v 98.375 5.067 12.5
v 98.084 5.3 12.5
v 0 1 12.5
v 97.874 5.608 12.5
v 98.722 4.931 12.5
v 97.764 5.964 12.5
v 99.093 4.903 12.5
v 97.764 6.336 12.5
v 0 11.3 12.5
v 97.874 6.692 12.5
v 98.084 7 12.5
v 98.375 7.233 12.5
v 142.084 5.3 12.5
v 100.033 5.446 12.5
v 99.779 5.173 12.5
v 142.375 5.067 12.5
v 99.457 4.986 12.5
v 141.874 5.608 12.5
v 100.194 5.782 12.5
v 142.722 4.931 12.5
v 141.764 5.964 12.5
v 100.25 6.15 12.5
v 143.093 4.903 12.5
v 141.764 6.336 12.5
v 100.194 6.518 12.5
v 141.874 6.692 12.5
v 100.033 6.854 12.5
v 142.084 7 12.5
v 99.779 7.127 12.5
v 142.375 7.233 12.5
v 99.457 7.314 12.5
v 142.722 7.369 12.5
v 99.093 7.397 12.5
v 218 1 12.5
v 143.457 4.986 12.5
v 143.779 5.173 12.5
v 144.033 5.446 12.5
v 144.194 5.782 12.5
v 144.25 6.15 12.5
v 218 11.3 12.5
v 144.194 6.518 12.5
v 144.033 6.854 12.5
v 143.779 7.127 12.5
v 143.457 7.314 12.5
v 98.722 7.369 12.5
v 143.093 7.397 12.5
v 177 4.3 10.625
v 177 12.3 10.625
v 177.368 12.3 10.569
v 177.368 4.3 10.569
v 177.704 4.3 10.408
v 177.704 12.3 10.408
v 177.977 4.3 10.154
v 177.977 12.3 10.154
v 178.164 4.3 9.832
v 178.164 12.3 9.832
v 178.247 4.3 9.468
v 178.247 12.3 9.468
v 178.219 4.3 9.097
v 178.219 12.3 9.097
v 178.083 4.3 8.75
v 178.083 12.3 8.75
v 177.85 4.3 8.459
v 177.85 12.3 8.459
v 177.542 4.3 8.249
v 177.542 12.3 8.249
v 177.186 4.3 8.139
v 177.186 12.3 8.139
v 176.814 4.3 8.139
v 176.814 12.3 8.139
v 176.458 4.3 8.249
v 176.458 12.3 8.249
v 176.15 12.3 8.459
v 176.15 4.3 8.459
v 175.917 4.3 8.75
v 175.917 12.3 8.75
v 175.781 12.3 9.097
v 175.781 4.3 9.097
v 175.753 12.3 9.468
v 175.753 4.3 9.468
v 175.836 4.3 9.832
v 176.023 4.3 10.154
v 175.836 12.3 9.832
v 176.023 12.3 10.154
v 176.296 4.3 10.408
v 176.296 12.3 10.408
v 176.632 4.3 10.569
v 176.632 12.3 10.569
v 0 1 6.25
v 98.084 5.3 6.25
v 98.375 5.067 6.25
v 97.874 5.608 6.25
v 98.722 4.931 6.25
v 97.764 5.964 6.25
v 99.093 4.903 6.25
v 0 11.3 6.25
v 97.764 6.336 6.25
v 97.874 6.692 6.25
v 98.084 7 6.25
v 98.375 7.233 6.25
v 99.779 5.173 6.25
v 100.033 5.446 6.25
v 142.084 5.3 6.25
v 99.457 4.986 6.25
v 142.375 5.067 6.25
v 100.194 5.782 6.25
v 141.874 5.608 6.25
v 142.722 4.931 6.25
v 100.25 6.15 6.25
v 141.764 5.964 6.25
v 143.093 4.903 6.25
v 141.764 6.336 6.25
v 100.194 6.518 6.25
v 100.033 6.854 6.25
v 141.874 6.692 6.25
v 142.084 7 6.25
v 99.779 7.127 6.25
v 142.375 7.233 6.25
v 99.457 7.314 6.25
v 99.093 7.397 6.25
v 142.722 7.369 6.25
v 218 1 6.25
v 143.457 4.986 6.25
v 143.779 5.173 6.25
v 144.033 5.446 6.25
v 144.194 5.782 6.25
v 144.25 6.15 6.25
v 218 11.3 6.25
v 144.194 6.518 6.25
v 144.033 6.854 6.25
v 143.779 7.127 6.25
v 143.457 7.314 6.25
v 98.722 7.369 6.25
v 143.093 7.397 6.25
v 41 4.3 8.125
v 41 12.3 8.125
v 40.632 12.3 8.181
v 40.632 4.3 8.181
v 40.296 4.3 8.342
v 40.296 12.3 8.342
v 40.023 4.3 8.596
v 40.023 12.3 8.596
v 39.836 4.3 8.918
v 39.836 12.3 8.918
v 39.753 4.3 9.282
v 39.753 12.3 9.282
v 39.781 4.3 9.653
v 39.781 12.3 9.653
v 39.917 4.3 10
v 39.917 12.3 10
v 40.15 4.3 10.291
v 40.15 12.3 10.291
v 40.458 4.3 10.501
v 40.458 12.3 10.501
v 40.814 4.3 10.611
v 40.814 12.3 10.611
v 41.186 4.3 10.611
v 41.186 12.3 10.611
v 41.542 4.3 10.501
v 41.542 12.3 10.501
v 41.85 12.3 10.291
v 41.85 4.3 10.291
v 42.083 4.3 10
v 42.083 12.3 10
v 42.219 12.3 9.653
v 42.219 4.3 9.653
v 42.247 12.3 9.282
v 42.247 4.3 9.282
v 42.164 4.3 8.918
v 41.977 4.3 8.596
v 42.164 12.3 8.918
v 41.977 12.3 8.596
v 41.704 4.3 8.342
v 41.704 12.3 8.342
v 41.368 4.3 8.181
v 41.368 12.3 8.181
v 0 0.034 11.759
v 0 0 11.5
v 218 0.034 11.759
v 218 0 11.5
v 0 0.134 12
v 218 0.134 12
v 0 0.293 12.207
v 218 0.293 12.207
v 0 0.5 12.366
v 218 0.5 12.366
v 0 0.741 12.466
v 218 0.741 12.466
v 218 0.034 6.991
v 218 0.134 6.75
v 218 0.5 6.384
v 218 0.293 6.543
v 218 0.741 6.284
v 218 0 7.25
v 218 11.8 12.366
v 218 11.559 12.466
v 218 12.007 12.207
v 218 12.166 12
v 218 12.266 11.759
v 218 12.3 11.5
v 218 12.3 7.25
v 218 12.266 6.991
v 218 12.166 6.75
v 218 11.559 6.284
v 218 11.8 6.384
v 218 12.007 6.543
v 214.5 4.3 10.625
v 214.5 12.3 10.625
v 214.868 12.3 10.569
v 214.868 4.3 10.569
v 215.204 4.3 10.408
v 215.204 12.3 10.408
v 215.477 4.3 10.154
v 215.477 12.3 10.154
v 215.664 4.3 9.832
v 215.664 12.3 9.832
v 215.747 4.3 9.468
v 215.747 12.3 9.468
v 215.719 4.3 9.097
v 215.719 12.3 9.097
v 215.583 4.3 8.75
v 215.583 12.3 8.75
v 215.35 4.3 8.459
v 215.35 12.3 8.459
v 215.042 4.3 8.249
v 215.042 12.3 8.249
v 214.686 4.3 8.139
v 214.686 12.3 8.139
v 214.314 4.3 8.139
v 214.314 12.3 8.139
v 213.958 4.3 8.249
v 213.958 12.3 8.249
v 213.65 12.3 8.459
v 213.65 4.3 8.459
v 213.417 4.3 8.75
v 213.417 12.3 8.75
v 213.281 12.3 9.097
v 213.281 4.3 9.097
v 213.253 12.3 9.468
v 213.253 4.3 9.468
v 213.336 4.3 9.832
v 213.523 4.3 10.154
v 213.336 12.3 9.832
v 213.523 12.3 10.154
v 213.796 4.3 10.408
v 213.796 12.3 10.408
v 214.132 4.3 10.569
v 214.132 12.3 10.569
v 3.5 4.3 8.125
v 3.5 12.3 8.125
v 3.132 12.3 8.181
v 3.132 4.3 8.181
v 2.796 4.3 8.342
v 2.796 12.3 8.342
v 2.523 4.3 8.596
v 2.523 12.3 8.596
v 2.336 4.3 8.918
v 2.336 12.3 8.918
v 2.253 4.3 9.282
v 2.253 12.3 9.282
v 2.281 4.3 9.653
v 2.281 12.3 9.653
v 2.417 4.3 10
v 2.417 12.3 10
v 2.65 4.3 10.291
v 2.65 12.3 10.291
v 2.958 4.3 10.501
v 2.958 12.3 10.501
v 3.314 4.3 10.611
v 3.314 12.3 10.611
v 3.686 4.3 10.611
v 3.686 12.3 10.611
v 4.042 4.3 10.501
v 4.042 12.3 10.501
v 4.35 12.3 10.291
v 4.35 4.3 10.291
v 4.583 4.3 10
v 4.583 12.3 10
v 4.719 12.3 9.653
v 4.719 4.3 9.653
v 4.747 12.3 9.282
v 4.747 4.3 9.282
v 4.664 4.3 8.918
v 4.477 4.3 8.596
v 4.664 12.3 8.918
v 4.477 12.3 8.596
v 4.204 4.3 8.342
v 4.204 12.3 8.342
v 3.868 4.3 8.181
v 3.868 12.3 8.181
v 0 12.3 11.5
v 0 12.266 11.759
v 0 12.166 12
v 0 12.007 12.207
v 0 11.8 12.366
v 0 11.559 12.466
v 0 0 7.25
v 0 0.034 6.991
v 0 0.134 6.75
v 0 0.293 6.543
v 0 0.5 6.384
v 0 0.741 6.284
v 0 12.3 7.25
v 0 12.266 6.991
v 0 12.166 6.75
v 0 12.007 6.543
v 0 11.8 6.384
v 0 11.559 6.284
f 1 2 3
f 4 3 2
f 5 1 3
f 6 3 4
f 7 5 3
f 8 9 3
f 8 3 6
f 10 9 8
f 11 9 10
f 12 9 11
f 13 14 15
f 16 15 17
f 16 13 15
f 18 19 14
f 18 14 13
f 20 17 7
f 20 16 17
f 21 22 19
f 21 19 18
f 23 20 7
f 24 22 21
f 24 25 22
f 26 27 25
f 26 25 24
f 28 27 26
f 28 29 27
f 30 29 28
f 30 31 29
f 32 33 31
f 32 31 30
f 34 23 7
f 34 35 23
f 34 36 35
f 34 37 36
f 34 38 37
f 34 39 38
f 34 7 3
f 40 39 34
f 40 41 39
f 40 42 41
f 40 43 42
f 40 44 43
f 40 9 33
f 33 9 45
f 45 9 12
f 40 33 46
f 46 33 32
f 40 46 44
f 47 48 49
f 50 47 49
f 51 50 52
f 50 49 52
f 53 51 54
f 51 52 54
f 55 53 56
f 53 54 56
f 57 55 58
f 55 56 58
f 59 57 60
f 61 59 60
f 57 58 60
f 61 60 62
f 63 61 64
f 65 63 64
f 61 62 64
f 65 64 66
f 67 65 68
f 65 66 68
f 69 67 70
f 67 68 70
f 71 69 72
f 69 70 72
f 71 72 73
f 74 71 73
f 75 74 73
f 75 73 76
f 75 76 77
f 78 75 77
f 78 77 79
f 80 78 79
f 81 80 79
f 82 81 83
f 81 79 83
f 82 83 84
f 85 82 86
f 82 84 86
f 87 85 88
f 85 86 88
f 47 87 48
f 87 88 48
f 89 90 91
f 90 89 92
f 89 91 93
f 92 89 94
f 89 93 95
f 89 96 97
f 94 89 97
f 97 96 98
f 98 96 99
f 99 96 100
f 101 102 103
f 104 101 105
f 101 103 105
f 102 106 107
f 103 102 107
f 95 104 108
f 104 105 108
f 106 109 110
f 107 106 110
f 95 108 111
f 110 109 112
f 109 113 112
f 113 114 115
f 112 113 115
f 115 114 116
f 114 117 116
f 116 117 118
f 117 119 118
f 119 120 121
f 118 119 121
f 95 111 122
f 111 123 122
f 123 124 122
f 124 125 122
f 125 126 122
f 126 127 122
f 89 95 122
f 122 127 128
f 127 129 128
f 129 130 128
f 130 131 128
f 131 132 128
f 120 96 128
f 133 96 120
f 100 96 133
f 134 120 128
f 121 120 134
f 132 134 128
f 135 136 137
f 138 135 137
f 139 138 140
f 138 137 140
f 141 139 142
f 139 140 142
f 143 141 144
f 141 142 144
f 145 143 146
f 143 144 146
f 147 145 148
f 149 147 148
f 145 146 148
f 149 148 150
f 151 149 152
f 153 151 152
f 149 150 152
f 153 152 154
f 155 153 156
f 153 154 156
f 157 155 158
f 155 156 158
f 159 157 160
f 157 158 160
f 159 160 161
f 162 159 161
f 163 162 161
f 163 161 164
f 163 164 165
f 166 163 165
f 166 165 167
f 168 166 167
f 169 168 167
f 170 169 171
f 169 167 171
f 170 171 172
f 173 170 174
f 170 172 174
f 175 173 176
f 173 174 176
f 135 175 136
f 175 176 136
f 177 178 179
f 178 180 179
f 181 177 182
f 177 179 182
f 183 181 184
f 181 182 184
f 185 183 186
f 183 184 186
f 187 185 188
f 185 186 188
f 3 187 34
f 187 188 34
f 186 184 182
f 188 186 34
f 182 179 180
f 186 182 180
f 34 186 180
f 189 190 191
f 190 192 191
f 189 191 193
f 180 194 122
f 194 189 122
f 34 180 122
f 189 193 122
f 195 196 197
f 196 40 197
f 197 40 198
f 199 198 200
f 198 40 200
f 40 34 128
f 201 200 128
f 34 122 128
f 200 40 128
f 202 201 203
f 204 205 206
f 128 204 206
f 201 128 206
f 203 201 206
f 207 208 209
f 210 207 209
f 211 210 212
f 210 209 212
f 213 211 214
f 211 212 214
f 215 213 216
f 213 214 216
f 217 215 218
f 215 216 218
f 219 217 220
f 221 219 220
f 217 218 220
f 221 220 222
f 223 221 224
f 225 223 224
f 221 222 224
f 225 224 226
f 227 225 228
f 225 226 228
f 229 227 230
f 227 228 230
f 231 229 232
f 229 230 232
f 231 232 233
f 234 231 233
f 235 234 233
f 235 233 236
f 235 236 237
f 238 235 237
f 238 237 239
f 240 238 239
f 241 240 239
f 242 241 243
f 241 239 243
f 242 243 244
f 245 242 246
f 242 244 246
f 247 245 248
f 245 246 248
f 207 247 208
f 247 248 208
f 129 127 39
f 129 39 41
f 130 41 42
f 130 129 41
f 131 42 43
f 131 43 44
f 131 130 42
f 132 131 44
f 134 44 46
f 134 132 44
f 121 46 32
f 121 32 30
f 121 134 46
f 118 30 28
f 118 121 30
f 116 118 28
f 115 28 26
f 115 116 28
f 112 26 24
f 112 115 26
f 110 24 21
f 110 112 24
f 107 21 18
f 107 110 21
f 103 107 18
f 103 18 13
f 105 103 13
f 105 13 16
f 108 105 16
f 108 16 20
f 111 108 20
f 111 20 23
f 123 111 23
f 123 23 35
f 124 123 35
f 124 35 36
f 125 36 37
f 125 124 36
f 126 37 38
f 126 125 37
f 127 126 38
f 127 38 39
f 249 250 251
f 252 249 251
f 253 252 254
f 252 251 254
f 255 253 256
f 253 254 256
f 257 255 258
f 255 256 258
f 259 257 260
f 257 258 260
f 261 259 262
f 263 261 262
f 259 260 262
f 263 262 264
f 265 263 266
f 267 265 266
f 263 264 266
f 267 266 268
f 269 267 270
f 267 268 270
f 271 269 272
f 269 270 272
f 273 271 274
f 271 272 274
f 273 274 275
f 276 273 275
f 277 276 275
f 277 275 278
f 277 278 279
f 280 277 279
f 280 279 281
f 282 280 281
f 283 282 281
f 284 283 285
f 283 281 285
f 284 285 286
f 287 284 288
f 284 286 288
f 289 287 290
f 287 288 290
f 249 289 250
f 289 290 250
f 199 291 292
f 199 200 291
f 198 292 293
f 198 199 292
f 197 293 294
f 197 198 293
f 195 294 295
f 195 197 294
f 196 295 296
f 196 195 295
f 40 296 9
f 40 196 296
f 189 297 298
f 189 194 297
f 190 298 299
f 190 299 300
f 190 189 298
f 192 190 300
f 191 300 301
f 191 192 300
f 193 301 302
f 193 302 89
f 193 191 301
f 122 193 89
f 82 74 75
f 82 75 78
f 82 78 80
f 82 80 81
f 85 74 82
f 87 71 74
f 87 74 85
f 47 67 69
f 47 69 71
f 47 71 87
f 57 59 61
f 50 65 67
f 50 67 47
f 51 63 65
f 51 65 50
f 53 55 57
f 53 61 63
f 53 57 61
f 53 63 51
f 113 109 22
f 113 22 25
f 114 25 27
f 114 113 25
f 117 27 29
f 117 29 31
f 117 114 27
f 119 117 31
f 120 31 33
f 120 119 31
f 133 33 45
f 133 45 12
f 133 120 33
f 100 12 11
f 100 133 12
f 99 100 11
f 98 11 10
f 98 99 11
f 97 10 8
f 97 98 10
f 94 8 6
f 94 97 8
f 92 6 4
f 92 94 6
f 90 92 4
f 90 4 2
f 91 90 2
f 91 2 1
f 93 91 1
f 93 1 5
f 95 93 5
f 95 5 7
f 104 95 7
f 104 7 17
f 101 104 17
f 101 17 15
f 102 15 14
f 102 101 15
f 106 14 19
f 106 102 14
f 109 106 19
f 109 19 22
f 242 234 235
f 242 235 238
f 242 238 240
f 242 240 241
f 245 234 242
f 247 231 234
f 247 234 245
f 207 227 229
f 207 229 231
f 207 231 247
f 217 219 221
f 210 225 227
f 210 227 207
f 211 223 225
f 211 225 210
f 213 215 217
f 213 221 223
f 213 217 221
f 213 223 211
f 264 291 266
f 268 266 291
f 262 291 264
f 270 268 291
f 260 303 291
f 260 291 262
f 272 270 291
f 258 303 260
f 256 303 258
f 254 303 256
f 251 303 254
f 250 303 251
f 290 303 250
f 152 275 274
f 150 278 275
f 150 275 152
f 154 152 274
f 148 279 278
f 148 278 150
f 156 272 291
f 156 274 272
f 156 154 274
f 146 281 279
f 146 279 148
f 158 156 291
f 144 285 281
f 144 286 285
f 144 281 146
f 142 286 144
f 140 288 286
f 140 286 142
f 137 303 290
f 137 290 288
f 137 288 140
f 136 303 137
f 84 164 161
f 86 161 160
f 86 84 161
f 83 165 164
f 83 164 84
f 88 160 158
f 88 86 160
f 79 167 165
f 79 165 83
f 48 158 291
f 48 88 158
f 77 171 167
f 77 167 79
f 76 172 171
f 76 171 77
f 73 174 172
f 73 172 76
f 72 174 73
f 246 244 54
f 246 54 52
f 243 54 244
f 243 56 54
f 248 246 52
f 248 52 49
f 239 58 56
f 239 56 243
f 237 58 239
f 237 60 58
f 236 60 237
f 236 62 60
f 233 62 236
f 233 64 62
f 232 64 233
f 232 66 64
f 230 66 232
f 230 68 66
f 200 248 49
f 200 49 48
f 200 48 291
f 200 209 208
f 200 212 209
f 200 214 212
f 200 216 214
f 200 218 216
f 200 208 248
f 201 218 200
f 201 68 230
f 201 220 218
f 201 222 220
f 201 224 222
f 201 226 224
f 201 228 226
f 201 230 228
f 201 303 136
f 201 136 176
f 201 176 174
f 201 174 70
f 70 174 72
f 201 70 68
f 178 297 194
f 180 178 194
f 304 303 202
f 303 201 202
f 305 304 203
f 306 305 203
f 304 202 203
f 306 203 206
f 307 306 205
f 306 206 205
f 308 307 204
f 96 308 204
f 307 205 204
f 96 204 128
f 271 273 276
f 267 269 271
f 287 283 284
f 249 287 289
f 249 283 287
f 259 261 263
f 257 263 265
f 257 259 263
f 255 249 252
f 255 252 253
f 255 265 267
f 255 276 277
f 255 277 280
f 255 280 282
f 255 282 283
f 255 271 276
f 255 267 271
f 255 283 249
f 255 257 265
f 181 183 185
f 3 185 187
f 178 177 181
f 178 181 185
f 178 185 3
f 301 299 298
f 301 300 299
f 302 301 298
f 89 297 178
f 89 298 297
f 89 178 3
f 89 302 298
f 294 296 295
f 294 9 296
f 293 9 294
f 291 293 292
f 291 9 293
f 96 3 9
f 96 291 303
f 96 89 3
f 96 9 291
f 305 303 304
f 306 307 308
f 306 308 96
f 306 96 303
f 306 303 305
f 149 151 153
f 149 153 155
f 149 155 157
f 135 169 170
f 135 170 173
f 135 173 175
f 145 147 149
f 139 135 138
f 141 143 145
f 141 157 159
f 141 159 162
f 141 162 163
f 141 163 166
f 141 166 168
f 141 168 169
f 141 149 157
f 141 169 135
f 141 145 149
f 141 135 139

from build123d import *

# Parameters (mm, degrees)
SKETCH1_W           = 218
SKETCH1_H           = 12.3
SKETCH1_R           = 1.25
BOSS_EXTRUDE1_DEPTH = 6.25
SKETCH2_R           = 1.25
CUT_EXTRUDE1_DEPTH  = 8
FILLET1_R           = 1


with BuildPart() as part:
    # Sketch1 → Boss-Extrude1 (new body)
    with BuildSketch(Plane.XY):
        with Locations((109, 6.15)):
            Rectangle(SKETCH1_W, SKETCH1_H)
        with Locations((143, 6.15)):
            Circle(SKETCH1_R, mode=Mode.SUBTRACT)
        with Locations((99, 6.15)):
            Circle(SKETCH1_R, mode=Mode.SUBTRACT)
    extrude(amount=BOSS_EXTRUDE1_DEPTH)

    # Sketch2 → Cut-Extrude1 (cut)
    with BuildSketch(Plane(origin=(0, 12.3, 0), x_dir=(1, 0, 0), z_dir=(0, 1, 0))):
        with Locations(Location((214.5, -3.125, 0), (0, 0, 270))):
            Circle(SKETCH2_R)
        with Locations(Location((177, -3.125, 0), (0, 0, 270))):
            Circle(SKETCH2_R)
        with Locations(Location((3.5, -3.125, 0), (0, 0, 90))):
            Circle(SKETCH2_R)
        with Locations(Location((41, -3.125, 0), (0, 0, 90))):
            Circle(SKETCH2_R)
    extrude(amount=-CUT_EXTRUDE1_DEPTH, mode=Mode.SUBTRACT)

    # Fillet1
    fillet1_edges = [part.edges().sort_by_distance(p)[0] for p in [
        (109, 12.3, 6.25),
        (109, 12.3, 0),
        (109, 0, 0),
        (109, 0, 6.25),
    ]]
    fillet(fillet1_edges, radius=FILLET1_R)


with BuildPart() as part_1:
    # Body-Move/Copy1: moved
    add(part.part.moved(Location((0, 5e-08, 6.25))))


solid = part_1.part
